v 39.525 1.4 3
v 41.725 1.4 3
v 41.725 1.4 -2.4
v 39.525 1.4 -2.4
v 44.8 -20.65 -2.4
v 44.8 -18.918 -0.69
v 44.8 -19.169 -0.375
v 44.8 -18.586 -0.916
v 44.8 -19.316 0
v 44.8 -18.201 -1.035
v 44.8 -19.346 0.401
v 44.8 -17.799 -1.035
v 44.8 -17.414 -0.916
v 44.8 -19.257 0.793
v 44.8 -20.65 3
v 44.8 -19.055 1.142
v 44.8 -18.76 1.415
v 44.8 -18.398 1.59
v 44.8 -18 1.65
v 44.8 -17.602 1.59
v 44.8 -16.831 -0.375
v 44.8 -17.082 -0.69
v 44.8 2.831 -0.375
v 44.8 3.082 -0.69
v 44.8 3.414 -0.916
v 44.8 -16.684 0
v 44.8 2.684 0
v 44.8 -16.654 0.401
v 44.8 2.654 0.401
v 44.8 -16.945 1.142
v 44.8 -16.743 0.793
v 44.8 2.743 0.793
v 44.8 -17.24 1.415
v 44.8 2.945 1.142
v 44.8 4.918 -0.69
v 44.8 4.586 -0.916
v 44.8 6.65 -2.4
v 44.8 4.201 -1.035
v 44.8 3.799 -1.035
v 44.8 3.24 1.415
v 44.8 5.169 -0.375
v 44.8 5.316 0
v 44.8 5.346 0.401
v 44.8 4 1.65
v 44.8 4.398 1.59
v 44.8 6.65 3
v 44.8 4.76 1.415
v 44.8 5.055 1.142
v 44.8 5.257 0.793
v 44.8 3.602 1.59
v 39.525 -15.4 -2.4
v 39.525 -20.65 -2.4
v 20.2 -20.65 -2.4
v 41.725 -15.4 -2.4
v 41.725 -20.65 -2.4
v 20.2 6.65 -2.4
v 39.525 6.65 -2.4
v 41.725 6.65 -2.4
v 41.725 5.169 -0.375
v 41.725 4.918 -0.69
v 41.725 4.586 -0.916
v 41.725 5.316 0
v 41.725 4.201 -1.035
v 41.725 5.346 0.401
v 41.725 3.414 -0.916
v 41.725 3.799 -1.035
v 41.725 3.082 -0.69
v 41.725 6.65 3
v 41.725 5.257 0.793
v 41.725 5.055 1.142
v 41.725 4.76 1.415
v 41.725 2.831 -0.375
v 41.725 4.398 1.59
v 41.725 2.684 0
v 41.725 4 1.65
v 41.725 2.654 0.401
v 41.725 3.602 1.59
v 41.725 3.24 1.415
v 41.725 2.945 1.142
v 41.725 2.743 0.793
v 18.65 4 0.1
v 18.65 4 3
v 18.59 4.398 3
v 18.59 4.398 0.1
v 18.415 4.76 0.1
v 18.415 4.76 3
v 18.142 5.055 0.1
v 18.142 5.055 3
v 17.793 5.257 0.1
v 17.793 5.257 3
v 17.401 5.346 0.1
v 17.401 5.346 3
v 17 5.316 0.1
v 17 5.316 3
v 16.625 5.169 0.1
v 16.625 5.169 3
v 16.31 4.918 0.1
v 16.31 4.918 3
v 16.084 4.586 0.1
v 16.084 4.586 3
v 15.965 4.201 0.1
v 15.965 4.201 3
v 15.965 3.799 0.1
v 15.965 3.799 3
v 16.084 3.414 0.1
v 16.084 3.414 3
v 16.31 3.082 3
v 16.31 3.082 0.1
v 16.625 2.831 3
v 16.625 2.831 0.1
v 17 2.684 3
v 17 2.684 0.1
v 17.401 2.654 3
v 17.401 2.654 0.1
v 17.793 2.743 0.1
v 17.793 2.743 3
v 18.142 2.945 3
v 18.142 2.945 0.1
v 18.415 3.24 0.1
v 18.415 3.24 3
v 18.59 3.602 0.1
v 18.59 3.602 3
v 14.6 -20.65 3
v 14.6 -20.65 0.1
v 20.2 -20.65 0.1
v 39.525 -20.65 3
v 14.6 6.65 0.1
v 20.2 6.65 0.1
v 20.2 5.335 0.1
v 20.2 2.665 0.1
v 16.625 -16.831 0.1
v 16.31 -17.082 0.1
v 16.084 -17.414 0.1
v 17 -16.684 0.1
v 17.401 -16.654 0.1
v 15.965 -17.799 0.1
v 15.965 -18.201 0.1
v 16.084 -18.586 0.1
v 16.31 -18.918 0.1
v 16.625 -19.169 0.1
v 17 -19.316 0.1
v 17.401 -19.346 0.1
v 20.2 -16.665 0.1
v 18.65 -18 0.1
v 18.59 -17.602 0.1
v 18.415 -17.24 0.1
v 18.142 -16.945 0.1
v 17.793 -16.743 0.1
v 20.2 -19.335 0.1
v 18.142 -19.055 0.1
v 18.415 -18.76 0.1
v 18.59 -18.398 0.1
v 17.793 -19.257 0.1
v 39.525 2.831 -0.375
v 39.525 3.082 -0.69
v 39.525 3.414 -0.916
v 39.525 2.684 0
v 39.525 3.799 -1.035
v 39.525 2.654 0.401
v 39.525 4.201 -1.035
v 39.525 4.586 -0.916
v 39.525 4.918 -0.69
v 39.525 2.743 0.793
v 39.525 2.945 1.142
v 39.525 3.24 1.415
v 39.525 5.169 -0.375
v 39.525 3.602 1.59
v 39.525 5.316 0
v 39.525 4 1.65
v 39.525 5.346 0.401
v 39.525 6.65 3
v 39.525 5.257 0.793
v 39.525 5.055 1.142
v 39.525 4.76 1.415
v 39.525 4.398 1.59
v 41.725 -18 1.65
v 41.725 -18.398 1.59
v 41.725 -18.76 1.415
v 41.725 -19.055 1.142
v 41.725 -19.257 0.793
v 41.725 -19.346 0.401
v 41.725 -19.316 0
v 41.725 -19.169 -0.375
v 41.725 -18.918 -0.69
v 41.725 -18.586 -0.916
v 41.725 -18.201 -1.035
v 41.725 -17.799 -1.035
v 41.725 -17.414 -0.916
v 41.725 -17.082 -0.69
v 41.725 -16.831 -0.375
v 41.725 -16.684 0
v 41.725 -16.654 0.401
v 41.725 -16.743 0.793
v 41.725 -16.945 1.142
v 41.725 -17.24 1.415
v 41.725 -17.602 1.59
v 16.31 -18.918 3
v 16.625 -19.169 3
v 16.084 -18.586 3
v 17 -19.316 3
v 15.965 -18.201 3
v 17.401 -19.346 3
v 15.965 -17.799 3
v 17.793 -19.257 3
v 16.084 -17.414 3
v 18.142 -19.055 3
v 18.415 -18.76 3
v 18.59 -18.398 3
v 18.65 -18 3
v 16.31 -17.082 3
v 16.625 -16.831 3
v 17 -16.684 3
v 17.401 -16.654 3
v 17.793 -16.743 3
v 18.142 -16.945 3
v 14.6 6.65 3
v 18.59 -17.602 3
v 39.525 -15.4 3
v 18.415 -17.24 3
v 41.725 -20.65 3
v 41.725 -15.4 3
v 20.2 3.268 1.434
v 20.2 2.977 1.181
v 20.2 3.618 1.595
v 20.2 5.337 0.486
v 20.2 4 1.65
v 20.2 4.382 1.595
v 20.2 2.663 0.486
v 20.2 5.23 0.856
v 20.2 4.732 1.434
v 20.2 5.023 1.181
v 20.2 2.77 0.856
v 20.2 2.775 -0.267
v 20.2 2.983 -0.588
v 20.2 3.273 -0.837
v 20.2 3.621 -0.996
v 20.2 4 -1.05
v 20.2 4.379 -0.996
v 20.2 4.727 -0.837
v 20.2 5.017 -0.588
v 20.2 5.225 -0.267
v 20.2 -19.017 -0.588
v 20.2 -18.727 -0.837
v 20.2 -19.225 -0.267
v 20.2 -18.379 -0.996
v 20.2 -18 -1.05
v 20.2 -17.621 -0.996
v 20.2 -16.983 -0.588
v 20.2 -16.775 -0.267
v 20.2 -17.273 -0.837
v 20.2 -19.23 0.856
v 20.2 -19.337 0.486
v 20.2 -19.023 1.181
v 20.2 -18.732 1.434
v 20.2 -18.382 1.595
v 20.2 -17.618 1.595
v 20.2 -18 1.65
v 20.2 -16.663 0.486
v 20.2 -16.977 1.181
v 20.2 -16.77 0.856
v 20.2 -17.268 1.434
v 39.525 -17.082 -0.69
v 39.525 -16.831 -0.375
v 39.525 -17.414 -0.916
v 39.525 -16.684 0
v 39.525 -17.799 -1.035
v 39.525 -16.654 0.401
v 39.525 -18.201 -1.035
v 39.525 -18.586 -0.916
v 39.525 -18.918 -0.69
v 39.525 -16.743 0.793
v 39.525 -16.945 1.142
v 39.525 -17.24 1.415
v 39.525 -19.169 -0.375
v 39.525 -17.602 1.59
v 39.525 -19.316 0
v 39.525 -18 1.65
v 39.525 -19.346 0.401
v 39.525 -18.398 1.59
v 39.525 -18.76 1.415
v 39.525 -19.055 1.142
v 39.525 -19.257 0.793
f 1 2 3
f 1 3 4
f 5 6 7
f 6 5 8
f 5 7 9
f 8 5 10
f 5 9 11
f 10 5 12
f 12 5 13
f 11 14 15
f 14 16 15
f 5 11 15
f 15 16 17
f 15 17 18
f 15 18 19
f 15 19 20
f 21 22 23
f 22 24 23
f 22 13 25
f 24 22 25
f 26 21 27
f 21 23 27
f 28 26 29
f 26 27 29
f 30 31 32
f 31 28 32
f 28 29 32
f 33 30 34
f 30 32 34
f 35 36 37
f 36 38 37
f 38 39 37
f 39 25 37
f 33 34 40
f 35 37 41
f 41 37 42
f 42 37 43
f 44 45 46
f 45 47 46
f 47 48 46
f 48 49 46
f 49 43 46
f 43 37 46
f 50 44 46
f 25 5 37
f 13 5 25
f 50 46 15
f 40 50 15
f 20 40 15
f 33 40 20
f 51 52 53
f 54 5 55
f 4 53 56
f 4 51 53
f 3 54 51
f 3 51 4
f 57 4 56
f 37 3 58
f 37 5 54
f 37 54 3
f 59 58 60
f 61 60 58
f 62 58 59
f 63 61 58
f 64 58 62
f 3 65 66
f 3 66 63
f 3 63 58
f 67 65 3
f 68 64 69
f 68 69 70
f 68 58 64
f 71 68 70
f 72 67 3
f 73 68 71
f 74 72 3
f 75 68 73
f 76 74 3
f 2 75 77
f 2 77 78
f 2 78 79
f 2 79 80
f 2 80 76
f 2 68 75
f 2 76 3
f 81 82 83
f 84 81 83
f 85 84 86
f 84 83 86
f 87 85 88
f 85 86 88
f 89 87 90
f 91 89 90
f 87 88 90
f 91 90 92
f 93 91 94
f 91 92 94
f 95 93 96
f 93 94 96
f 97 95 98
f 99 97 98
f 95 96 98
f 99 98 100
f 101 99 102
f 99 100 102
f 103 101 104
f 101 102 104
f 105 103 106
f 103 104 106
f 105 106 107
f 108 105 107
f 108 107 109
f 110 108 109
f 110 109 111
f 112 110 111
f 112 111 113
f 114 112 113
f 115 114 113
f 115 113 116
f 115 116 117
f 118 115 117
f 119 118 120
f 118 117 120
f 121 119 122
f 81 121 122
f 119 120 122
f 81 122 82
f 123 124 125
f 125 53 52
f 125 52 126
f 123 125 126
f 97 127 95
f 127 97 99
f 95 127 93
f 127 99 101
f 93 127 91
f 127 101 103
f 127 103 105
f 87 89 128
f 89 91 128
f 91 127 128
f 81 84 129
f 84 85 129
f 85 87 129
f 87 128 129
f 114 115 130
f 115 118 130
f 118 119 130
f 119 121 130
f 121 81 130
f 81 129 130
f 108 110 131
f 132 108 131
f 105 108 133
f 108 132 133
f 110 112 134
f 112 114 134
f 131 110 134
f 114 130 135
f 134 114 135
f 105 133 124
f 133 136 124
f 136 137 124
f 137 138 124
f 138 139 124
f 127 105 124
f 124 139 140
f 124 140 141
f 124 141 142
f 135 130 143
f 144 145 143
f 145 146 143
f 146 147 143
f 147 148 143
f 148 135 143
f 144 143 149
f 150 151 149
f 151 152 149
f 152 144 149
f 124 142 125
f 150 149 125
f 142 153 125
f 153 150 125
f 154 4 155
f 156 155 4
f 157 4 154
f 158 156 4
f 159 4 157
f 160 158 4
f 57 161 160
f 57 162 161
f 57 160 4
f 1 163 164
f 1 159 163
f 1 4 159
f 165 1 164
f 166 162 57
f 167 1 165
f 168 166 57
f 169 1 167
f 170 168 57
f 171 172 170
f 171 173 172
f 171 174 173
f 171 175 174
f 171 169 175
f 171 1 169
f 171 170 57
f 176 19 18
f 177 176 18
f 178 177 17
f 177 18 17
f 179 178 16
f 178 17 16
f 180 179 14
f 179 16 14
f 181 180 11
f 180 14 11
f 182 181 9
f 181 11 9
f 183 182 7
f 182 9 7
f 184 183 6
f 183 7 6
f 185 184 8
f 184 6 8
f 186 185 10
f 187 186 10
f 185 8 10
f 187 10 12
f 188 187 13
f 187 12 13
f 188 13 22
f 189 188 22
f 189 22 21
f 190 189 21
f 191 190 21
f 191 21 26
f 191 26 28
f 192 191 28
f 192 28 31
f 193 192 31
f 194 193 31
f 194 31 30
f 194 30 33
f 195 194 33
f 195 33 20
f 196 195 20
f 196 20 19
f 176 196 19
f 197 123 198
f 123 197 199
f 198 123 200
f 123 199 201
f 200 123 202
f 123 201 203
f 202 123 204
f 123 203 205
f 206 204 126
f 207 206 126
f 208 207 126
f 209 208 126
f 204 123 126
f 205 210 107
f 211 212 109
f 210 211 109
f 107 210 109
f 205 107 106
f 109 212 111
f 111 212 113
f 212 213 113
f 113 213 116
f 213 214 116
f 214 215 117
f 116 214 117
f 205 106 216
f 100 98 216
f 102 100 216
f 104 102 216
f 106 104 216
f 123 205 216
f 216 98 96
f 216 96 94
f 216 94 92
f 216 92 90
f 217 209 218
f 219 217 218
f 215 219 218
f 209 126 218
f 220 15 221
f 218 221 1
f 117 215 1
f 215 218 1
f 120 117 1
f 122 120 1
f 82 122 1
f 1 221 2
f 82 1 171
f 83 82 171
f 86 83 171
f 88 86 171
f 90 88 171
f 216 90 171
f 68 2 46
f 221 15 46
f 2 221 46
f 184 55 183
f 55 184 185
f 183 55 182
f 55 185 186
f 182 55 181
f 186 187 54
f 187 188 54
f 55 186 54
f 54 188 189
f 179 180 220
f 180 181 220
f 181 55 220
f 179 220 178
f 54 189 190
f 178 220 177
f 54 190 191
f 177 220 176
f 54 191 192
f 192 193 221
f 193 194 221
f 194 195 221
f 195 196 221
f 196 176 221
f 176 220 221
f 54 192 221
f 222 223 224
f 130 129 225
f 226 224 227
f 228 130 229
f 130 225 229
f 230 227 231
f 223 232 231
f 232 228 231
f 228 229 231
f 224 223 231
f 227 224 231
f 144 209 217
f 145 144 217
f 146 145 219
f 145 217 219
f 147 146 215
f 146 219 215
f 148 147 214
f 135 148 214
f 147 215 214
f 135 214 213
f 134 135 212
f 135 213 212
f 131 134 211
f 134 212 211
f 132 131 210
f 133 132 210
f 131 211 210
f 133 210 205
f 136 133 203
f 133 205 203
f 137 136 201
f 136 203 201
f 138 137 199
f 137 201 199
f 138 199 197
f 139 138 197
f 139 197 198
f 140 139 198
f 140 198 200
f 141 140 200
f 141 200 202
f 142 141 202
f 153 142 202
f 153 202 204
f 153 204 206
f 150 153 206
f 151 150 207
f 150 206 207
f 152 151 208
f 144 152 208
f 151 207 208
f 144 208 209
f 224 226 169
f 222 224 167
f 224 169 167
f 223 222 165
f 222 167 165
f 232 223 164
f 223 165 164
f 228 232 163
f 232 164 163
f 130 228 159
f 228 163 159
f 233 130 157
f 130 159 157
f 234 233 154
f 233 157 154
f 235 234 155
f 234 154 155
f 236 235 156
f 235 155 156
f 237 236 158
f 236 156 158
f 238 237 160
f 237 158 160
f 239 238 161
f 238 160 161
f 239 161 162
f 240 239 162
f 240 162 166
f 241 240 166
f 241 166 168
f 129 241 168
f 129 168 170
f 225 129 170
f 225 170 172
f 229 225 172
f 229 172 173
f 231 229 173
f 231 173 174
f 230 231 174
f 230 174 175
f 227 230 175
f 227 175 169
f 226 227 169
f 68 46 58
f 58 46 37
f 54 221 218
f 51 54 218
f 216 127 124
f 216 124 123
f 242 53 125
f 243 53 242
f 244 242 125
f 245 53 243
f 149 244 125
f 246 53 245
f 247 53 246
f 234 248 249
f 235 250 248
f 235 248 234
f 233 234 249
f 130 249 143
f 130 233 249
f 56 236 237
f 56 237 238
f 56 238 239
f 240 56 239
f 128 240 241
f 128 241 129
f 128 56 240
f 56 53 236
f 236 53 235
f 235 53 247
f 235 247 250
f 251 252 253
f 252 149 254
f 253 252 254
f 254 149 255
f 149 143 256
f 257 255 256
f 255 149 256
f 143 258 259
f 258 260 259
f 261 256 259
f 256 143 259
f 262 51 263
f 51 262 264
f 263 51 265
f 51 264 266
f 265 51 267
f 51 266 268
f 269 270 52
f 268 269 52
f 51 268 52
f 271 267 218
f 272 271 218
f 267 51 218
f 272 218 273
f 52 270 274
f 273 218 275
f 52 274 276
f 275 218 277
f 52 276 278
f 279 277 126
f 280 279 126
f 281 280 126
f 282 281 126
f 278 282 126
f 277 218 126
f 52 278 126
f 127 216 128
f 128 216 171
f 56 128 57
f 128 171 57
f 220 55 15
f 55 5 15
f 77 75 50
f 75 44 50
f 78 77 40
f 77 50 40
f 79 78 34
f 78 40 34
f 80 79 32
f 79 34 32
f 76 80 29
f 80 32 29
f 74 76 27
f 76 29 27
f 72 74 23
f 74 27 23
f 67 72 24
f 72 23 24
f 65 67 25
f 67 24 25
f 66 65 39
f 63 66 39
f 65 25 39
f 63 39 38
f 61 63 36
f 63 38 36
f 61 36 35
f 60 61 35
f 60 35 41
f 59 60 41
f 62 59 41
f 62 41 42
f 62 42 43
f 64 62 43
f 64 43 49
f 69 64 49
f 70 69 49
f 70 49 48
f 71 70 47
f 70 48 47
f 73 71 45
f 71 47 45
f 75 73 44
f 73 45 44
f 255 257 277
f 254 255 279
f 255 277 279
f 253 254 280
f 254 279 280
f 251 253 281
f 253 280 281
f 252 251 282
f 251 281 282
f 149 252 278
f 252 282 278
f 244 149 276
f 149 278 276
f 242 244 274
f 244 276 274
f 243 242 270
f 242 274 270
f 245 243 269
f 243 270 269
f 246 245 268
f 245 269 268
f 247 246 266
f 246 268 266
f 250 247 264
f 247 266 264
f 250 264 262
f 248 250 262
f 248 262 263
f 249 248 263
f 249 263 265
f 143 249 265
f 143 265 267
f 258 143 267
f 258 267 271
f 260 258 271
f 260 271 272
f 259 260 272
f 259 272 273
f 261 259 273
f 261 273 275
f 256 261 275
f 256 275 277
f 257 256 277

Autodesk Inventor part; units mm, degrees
ref_plane "YZ Plane" through (0, 0, 0) normal (1, 0, 0) x (0, 1, 0)
ref_plane "XZ Plane" through (0, 0, 0) normal (0, 1, 0) x (-1, 0, 0)
ref_plane "XY Plane" through (0, 0, 0) normal (0, 0, 1) x (1, 0, 0)
ref_plane "작업 평면1" through (44.8, 0, -17) normal (-1, 0, 0) x (0, 0, 1)
sketch "스케치2" plane through (44.8, 0, -17) normal (-1, 0, 0) x (0, 0, 1)
  arc A0 (-19.5808, 6.2636) -> (-20.1, 4.5766) centre (-17.1, 4.5766) ccw projected
  line L0 (-20.1, -39.6766) -> (-20.1, 4.5766) projected
  arc A1 (-20.1, -39.6766) -> (-19.5808, -41.3636) centre (-17.1, -39.6766) ccw projected
  line L1 (-15.8929, -46.7869) -> (-19.5808, -41.3636) projected
  arc A2 (-15.8929, -46.7869) -> (-13.4121, -48.1) centre (-13.4121, -45.1) ccw projected
  line L2 (13.4121, -48.1) -> (-13.4121, -48.1) projected
  arc A3 (13.4121, -48.1) -> (15.8929, -46.7869) centre (13.4121, -45.1) ccw projected
  line L3 (19.5808, -41.3636) -> (15.8929, -46.7869) projected
  arc A4 (19.5808, -41.3636) -> (20.1, -39.6766) centre (17.1, -39.6766) ccw projected
  line L4 (20.1, 4.5766) -> (20.1, -39.6766) projected
  arc A5 (20.1, 4.5766) -> (19.5808, 6.2636) centre (17.1, 4.5766) ccw projected
  line L5 (15.5953, 12.1246) -> (19.5808, 6.2636) projected
  arc A6 (15.5953, 12.1246) -> (13.9414, 13) centre (13.9414, 11) ccw projected
  line L6 (7.65, 13) -> (13.9414, 13) projected
  arc A7 (9.15, 11.5) -> (7.65, 13) centre (7.65, 11.5) ccw projected
  line L7 (9.15, 11.5) -> (9.15, 10) projected
  arc A8 (9.15, 10) -> (11.5, 7.65) centre (11.5, 10) ccw projected
  line L8 (11.5, 7.65) -> (13.5, 7.65) projected
  arc A9 (14.5, 6.65) -> (13.5, 7.65) centre (13.5, 6.65) ccw projected
  line L9 (14.5, 6.65) -> (14.5, -36.15) projected
  arc A10 (13.5, -37.15) -> (14.5, -36.15) centre (13.5, -36.15) ccw projected
  line L10 (13.5, -37.15) -> (11.5, -37.15) projected
  arc A11 (11.5, -37.15) -> (9.15, -39.5) centre (11.5, -39.5) ccw projected
  line L11 (9.15, -39.5) -> (9.15, -41.5) projected
  arc A12 (8.15, -42.5) -> (9.15, -41.5) centre (8.15, -41.5) ccw projected
  line L12 (8.15, -42.5) -> (-8.15, -42.5) projected
  arc A13 (-9.15, -41.5) -> (-8.15, -42.5) centre (-8.15, -41.5) ccw projected
  line L13 (-9.15, -41.5) -> (-9.15, -39.5) projected
  arc A14 (-9.15, -39.5) -> (-11.5, -37.15) centre (-11.5, -39.5) ccw projected
  line L14 (-11.5, -37.15) -> (-13.5, -37.15) projected
  arc A15 (-14.5, -36.15) -> (-13.5, -37.15) centre (-13.5, -36.15) ccw projected
  line L15 (-14.5, -36.15) -> (-14.5, 6.65) projected
  arc A16 (-13.5, 7.65) -> (-14.5, 6.65) centre (-13.5, 6.65) ccw projected
  line L16 (-13.5, 7.65) -> (-11.5, 7.65) projected
  arc A17 (-11.5, 7.65) -> (-9.15, 10) centre (-11.5, 10) ccw projected
  line L17 (-9.15, 10) -> (-9.15, 11.5) projected
  arc A18 (-7.65, 13) -> (-9.15, 11.5) centre (-7.65, 11.5) ccw projected
  line L18 (-13.9414, 13) -> (-7.65, 13) projected
  arc A19 (-13.9414, 13) -> (-15.5953, 12.1246) centre (-13.9414, 11) ccw projected
  line L19 (-19.5808, 6.2636) -> (-15.5953, 12.1246) projected
  circle A20 centre (17.3, 4) radius 1.35 projected
  circle A21 centre (17.3, -18) radius 1.35 projected
  circle A22 centre (11, -45.3) radius 1.35 projected
  circle A23 centre (-17.3, 4) radius 1.35 projected
  circle A24 centre (-17.3, -18) radius 1.35 projected
  circle A25 centre (-11, -45.3) radius 1.35 projected
  circle A26 centre (17.3, -40) radius 1.35 projected
  circle A27 centre (-17.3, -40) radius 1.35 projected
  line L20 (17.3, -19.35) -> (17.3, 5.35)
  line L21 (20.1, 4.5766) -> (20.1, 6.65)
  line L22 (20.1, 6.65) -> (14.5, 6.65)
  line L23 (17.3, -7) -> (20.1, -7)
  arc A28 (19.5808, -20.2636) -> (20.1, -18.5766) centre (17.1, -18.5766) ccw
  line L24 (20.1, -18.5766) -> (20.1, -20.65)
  line L25 (20.1, -20.65) -> (14.5, -20.65)
  line L26 (20.1, -20.65) -> (14.5, -20.65)
  line L27 (14.5, -20.65) -> (14.5, 6.65)
  line L28 (14.5, 6.65) -> (20.1, 6.65)
  line L29 (20.1, 6.65) -> (20.1, -20.65)
  line L30 (14.6, -36.15) -> (14.6, 6.65)
  arc A29 (14.6, 6.65) -> (13.5, 7.75) centre (13.5, 6.65) ccw
  line L31 (13.5, 7.75) -> (11.5, 7.75)
  arc A30 (9.25, 10) -> (11.5, 7.75) centre (11.5, 10) ccw
  line L32 (9.25, 10) -> (9.25, 11.5)
  arc A31 (9.25, 11.5) -> (8.4246, 12.9) centre (7.65, 11.5) ccw
  line L33 (8.4246, 12.9) -> (13.9414, 12.9)
  arc A32 (15.5126, 12.0684) -> (13.9414, 12.9) centre (13.9414, 11) ccw
  line L34 (15.5126, 12.0684) -> (19.4981, 6.2073)
  arc A33 (20, 4.5766) -> (19.4981, 6.2073) centre (17.1, 4.5766) ccw
  line L35 (20, 4.5766) -> (20, -39.6766)
  arc A34 (19.4981, -41.3073) -> (20, -39.6766) centre (17.1, -39.6766) ccw
  line L36 (19.4981, -41.3073) -> (15.8102, -46.7307)
  arc A35 (13.4121, -48) -> (15.8102, -46.7307) centre (13.4121, -45.1) ccw
  line L37 (13.4121, -48) -> (-13.4121, -48)
  arc A36 (-15.8102, -46.7307) -> (-13.4121, -48) centre (-13.4121, -45.1) ccw
  line L38 (-15.8102, -46.7307) -> (-19.4981, -41.3073)
  arc A37 (-20, -39.6766) -> (-19.4981, -41.3073) centre (-17.1, -39.6766) ccw
  line L39 (-20, -39.6766) -> (-20, 4.5766)
  arc A38 (-19.4981, 6.2073) -> (-20, 4.5766) centre (-17.1, 4.5766) ccw
  line L40 (-19.4981, 6.2073) -> (-15.5126, 12.0684)
  arc A39 (-13.9414, 12.9) -> (-15.5126, 12.0684) centre (-13.9414, 11) ccw
  line L41 (-13.9414, 12.9) -> (-8.4246, 12.9)
  arc A40 (-8.4246, 12.9) -> (-9.25, 11.5) centre (-7.65, 11.5) ccw
  line L42 (-9.25, 11.5) -> (-9.25, 10)
  arc A41 (-11.5, 7.75) -> (-9.25, 10) centre (-11.5, 10) ccw
  line L43 (-11.5, 7.75) -> (-13.5, 7.75)
  arc A42 (-13.5, 7.75) -> (-14.6, 6.65) centre (-13.5, 6.65) ccw
  line L44 (-14.6, 6.65) -> (-14.6, -36.15)
  arc A43 (-14.6, -36.15) -> (-13.5, -37.25) centre (-13.5, -36.15) ccw
  line L45 (-13.5, -37.25) -> (-11.5, -37.25)
  arc A44 (-9.25, -39.5) -> (-11.5, -37.25) centre (-11.5, -39.5) ccw
  line L46 (-9.25, -39.5) -> (-9.25, -41.5)
  arc A45 (-9.25, -41.5) -> (-8.15, -42.6) centre (-8.15, -41.5) ccw
  line L47 (-8.15, -42.6) -> (8.15, -42.6)
  arc A46 (8.15, -42.6) -> (9.25, -41.5) centre (8.15, -41.5) ccw
  line L48 (9.25, -41.5) -> (9.25, -39.5)
  arc A47 (11.5, -37.25) -> (9.25, -39.5) centre (11.5, -39.5) ccw
  line L49 (11.5, -37.25) -> (13.5, -37.25)
  arc A48 (13.5, -37.25) -> (14.6, -36.15) centre (13.5, -36.15) ccw
  line L50 (20, 4.5766) -> (20, 6.65)
  line L51 (17, 8.5) -> (17, -44.6) projected
  line L52 (17, 8.5) -> (17, -44.6) projected
  point P0 (17, 0)
  point P1 (17.3, -18)
  point P2 (14.6, -20.65)
  point P3 (20, -20.65)
  dimension "d3" = 0.1
extrude "돌출2" add sketch "스케치2" along normal blind 24.6 contours L25 L51 A21 L20 L23 L35 | L25 L30 L22 L51 A20 A21 | L23 L20 A20 L51 L22 L34 A33 L35 | L50 A33 L34 L22 L5 A5 | A5 L5 L22 L50 | L20 A21 L51 A20
sketch "스케치3" plane through (20.2, 0, -17) normal (-1, 0, 0) x (0, 0, 1)
  line L0 (17, 8.5) -> (17, -44.6) projected
  line L1 (14.6, -20.65) -> (20, -20.65) projected
  line L2 (20, -20.65) -> (20, 6.65) projected
  line L3 (17, -20.65) -> (20, -20.65)
  line L4 (20, -20.65) -> (20, 6.65)
  line L5 (20, 6.65) -> (17, 6.65)
  line L6 (17, 6.65) -> (17, -20.65)
  line L7 (17.1, 8.5) -> (17.1, -44.6)
  point P0 (17, 0)
  point P1 (17.1, 6.65)
  point P2 (17.1, -20.65)
  dimension "d6" = 0.1
extrude "돌출3" add sketch "스케치3" along normal blind 5.6 contours L5 L2 L1 L7
sketch "스케치4" plane through (44.8, -20.65, 3) normal (0, 0, 1) x (1, 0, 0)
  line L0 (-31.3, -19.1) -> (-33.3, -19.1) projected
  arc A0 (-33.3, -19.1) -> (-35.55, -21.35) centre (-33.3, -21.35) ccw projected
  line L1 (-35.55, -21.35) -> (-35.55, -23.35) projected
  arc A1 (-36.55, -24.35) -> (-35.55, -23.35) centre (-36.55, -23.35) ccw projected
  line L2 (-36.55, -24.35) -> (-53.05, -24.35) projected
  arc A2 (-54.05, -23.35) -> (-53.05, -24.35) centre (-53.05, -23.35) ccw projected
  line L3 (-54.05, -23.35) -> (-54.05, -21.35) projected
  arc A3 (-54.05, -21.35) -> (-56.3, -19.1) centre (-56.3, -21.35) ccw projected
  line L4 (-56.3, -19.1) -> (-58.3, -19.1) projected
  arc A4 (-59.3, -18.1) -> (-58.3, -19.1) centre (-58.3, -18.1) ccw projected
  line L5 (-59.3, -18.1) -> (-59.3, 28.9) projected
  arc A5 (-58.3, 29.9) -> (-59.3, 28.9) centre (-58.3, 28.9) ccw projected
  line L6 (-58.3, 29.9) -> (-56.3, 29.9) projected
  arc A6 (-56.3, 29.9) -> (-54.05, 32.15) centre (-56.3, 32.15) ccw projected
  line L7 (-54.05, 32.15) -> (-54.05, 35.15) projected
  line L8 (-59.8, 35.15) -> (-54.05, 35.15) projected
  line L9 (-64.9, 29.15) -> (-59.8, 35.15) projected
  line L10 (-64.9, -23.95) -> (-64.9, 29.15) projected
  line L11 (-59.8, -29.95) -> (-64.9, -23.95) projected
  line L12 (-29.8, -29.95) -> (-59.8, -29.95) projected
  line L13 (-24.7, -23.95) -> (-29.8, -29.95) projected
  line L14 (-24.7, 29.15) -> (-24.7, -23.95) projected
  line L15 (-29.8, 35.15) -> (-24.7, 29.15) projected
  line L16 (-35.55, 35.15) -> (-29.8, 35.15) projected
  line L17 (-35.55, 35.15) -> (-35.55, 32.15) projected
  arc A7 (-35.55, 32.15) -> (-33.3, 29.9) centre (-33.3, 32.15) ccw projected
  line L18 (-33.3, 29.9) -> (-31.3, 29.9) projected
  arc A8 (-30.3, 28.9) -> (-31.3, 29.9) centre (-31.3, 28.9) ccw projected
  line L19 (-30.3, 28.9) -> (-30.3, -18.1) projected
  arc A9 (-31.3, -19.1) -> (-30.3, -18.1) centre (-31.3, -18.1) ccw projected
  circle A10 centre (-27.5, 24.65) radius 1.35 projected
  circle A11 centre (-27.5, 2.65) radius 1.35 projected
  circle A12 centre (-33.8, -27.15) radius 1.35 projected
  circle A13 centre (-62.1, 24.65) radius 1.35 projected
  circle A14 centre (-62.1, 2.65) radius 1.35 projected
  circle A15 centre (-55.8, -27.15) radius 1.35 projected
  circle A16 centre (-27.5, -19.35) radius 1.35 projected
  circle A17 centre (-62.1, -19.35) radius 1.35 projected
  point P0 (-44.8, 20.65)
extrude "돌출4" cut sketch "스케치4" against normal up to next contours A10 | A11
sketch "스케치5" plane through (44.8, -20.65, 3) normal (0, 0, 1) x (1, 0, 0)
  line L0 (-5.275, 23.4) -> (2.4, 23.4)
  line L1 (-5.275, 25.9) -> (2.4, 25.9)
  line L2 (-5.275, 23.4) -> (-5.275, 25.9)
  line L3 (-5.275, 24.65) -> (2.4, 24.65)
  line L4 (-5.275, 24.65) -> (-3.075, 24.65)
  line L5 (-3.075, 24.65) -> (-3.075, 22.05)
  line L6 (-3.075, 22.05) -> (-5.275, 22.05)
  line L7 (-5.275, 22.05) -> (-5.275, 24.65)
  line L8 (-3.075, 24.65) -> (-3.075, 27.25)
  line L9 (-3.075, 27.25) -> (-5.275, 27.25)
  line L10 (-5.275, 27.25) -> (-5.275, 24.65)
  line L11 (0, 27.3) -> (-30.2, 27.3) projected
  line L12 (-3.075, 27.25) -> (-5.275, 27.25)
  line L13 (-5.275, 27.25) -> (-5.275, 27.3)
  line L14 (-5.275, 27.3) -> (-3.075, 27.3)
  line L15 (-3.075, 27.3) -> (-3.075, 27.25)
  circle A0 centre (-27.5, 24.65) radius 1.35 projected
  circle A1 centre (-27.5, 2.65) radius 1.35 projected
  line L16 (0, 0) -> (0, 27.3) projected
  line L17 (0, 27.3) -> (-30.2, 27.3) projected
  line L18 (-30.2, 0) -> (-30.2, 27.3) projected
  line L19 (0, 0) -> (-30.2, 0) projected
  line L20 (0, 13.65) -> (-30.2, 13.65)
  line L21 (-5.275, 3.9) -> (-5.275, 1.4)
  line L22 (-5.275, 2.65) -> (-3.075, 2.65)
  line L23 (-3.075, 2.65) -> (-3.075, 5.25)
  line L24 (-3.075, 5.25) -> (-5.275, 5.25)
  line L25 (-5.275, 5.25) -> (-5.275, 2.65)
  line L26 (-3.075, 2.65) -> (-3.075, 0.05)
  line L27 (-3.075, 0.05) -> (-5.275, 0.05)
  line L28 (-5.275, 0.05) -> (-5.275, 2.65)
  line L29 (-3.075, 0.05) -> (-5.275, 0.05)
  line L30 (-5.275, 0.05) -> (-5.275, 0)
  line L31 (-5.275, 0) -> (-3.075, 0)
  line L32 (-3.075, 0) -> (-3.075, 0.05)
  point P0 (-44.8, 20.65)
  point P1 (-3.075, 27.3)
  point P2 (-5.275, 27.25)
  point P3 (-5.275, 25.9)
  point P4 (-5.275, 23.4)
  point P5 (-5.275, 0.05)
  point P6 (-5.275, 0)
  point P7 (-3.075, 0)
  point P8 (-5.275, 3.9)
  point P9 (-5.275, 1.4)
  dimension "d11" = 2.2
  dimension "d12" = 2.6
extrude "돌출5" cut sketch "스케치5" against normal blind 10 contours L2 L3 L5 L0 | L0 L5 L6 L7 | L2 L1 L8 L3 | L10 L9 L8 L1 | L13 L11 L15 L9 | L19 L30 L27 L32 | L27 L28 L21 L22 L26 | L22 L21 L25 L24 L23
properties part number "64-106_connect"
